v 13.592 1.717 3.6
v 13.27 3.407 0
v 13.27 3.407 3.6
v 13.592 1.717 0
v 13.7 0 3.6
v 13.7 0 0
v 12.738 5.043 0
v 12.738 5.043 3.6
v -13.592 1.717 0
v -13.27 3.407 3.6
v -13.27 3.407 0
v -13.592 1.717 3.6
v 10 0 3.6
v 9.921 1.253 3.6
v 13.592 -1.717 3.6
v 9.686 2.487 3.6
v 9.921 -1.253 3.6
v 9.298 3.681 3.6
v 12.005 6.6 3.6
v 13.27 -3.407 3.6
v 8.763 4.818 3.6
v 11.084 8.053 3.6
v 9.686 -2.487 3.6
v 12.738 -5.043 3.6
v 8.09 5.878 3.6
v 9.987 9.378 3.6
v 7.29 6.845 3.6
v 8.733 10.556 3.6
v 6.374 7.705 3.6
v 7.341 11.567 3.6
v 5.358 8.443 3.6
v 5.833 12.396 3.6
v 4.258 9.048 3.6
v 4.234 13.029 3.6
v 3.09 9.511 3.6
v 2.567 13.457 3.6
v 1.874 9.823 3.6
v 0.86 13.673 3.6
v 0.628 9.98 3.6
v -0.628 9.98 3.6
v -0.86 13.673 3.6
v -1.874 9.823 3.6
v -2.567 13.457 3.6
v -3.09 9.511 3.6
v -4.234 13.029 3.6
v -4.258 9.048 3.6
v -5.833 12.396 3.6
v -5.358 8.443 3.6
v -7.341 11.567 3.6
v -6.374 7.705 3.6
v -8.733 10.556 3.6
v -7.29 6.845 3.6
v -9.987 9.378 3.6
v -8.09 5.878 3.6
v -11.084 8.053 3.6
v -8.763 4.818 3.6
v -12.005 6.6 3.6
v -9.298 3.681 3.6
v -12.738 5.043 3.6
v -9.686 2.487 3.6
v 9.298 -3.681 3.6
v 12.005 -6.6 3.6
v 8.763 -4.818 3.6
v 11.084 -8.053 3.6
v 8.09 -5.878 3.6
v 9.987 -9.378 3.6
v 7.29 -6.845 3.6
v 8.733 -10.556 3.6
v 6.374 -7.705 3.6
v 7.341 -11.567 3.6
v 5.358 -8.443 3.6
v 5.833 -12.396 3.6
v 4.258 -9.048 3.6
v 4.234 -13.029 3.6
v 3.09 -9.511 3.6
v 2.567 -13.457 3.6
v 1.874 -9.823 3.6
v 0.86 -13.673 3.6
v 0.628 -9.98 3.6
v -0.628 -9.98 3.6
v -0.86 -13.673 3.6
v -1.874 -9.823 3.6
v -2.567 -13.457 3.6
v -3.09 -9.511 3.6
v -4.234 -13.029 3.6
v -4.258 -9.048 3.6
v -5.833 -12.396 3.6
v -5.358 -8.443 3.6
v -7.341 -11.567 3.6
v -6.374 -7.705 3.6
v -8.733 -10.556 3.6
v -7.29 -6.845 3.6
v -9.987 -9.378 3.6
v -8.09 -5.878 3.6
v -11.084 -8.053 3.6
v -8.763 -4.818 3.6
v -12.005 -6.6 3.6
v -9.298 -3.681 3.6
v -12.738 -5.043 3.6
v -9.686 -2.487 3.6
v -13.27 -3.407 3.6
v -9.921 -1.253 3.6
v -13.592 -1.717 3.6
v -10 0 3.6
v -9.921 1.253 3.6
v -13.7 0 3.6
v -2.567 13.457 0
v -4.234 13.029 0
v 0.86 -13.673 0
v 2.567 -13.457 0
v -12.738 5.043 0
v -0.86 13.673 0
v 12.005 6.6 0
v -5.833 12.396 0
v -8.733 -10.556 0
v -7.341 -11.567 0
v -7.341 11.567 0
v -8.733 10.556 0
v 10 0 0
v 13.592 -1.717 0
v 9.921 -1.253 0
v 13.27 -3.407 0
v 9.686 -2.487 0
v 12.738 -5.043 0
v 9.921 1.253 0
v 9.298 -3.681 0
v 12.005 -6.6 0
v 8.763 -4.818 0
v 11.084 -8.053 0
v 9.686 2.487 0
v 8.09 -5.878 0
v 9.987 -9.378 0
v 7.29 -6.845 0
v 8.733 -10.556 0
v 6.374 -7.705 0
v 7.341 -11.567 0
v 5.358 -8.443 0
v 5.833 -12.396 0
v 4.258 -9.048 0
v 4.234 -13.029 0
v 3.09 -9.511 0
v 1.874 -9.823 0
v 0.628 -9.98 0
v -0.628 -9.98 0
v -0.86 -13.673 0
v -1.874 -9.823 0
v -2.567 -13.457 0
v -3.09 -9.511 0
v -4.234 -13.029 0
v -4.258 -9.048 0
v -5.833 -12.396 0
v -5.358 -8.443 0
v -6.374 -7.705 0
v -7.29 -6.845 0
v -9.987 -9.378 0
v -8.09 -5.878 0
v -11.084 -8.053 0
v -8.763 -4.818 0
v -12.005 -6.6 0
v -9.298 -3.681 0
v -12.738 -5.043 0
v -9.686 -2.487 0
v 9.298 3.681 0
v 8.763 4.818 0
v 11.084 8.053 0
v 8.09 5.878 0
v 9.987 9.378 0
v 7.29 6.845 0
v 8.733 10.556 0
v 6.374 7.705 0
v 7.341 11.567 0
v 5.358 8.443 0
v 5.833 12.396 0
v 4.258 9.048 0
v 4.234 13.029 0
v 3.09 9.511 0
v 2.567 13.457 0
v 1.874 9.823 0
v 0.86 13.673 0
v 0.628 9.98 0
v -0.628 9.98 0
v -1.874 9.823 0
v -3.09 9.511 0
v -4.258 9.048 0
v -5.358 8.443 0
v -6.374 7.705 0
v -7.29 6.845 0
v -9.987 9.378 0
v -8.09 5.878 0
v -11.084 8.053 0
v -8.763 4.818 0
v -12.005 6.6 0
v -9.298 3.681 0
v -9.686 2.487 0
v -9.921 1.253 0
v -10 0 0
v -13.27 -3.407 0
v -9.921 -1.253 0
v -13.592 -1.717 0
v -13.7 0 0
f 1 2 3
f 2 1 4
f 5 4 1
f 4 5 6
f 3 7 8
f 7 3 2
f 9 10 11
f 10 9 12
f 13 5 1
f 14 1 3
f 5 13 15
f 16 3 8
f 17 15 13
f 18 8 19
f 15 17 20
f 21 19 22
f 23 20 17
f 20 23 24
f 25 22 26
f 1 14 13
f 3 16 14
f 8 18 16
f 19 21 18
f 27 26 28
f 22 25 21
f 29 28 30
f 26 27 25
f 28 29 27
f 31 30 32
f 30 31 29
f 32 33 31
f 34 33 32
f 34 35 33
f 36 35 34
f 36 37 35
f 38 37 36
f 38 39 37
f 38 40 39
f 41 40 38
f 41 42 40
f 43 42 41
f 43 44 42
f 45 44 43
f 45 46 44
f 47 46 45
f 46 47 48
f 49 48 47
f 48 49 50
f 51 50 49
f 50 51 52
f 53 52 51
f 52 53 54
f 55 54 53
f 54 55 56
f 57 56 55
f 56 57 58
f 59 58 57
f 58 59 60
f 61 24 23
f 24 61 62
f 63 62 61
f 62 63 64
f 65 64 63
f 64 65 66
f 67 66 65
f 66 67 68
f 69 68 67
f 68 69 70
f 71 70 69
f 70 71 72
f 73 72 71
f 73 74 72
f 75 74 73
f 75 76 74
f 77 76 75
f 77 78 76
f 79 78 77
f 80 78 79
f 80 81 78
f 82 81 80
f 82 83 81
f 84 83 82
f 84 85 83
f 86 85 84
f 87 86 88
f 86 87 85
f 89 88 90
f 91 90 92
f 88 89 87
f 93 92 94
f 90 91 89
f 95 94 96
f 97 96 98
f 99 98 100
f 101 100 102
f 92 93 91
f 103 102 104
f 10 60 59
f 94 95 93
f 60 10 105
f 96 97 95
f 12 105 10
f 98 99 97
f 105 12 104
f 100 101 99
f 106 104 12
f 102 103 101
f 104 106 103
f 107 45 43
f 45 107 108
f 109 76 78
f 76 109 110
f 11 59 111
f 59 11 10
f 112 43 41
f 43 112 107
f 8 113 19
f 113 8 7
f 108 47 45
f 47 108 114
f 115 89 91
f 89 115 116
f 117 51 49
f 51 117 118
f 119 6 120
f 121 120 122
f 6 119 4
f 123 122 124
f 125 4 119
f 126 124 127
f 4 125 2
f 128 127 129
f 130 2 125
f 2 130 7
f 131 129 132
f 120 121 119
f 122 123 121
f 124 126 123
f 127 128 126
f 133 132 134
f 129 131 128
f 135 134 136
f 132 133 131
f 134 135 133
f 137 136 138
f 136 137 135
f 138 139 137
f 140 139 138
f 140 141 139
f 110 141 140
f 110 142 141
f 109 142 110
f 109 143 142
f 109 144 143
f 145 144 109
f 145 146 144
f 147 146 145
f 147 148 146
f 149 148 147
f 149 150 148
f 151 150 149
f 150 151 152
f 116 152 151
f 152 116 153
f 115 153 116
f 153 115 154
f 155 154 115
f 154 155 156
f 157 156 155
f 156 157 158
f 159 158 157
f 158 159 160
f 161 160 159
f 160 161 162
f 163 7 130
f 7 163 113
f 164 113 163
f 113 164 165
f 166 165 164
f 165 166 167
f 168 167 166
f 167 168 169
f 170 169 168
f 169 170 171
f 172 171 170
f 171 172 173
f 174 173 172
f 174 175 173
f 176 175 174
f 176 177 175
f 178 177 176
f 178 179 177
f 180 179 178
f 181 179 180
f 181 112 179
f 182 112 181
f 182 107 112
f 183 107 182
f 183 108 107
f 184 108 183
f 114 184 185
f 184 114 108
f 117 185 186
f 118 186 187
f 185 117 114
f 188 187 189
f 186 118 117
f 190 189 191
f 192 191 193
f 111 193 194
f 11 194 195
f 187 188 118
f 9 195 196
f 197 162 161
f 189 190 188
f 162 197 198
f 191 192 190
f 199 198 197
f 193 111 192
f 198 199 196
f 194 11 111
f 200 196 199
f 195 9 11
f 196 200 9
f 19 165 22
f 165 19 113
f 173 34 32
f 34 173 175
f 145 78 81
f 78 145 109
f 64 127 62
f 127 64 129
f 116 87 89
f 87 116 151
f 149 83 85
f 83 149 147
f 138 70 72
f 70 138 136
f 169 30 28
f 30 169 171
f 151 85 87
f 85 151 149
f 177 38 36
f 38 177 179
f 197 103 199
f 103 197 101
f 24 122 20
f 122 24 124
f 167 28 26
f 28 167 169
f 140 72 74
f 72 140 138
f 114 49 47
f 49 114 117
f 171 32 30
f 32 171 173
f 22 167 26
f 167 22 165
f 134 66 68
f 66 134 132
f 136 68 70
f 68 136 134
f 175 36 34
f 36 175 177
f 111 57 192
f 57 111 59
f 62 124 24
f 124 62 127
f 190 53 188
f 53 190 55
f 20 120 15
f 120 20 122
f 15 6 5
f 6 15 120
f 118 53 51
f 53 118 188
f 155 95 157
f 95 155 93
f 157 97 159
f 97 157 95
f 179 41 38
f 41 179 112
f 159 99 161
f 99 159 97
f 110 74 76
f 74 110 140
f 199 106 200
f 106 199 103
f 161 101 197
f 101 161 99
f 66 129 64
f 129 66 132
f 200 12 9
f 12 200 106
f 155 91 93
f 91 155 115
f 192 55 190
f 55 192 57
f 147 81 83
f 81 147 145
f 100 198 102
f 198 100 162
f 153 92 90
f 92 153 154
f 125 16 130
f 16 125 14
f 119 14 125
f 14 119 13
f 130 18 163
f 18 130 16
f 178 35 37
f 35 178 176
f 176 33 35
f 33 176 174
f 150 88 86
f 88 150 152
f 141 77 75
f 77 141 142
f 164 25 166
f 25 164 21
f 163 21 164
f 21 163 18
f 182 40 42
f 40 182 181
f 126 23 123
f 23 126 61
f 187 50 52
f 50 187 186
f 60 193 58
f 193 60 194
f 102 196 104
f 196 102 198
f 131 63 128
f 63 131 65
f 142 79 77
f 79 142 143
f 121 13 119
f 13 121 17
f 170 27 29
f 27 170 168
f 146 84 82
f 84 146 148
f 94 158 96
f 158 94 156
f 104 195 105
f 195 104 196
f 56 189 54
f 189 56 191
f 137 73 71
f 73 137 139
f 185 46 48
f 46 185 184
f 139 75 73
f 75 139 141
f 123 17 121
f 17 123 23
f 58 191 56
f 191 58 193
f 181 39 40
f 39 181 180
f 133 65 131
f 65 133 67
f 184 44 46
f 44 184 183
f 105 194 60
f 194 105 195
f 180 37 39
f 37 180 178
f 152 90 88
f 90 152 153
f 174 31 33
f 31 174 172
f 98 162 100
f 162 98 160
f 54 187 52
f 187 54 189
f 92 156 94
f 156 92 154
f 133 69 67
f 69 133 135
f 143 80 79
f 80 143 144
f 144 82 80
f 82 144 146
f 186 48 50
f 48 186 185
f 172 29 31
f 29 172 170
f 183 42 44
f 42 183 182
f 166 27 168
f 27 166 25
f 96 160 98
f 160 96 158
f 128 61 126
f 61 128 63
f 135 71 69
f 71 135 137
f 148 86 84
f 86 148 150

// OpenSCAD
$fn = 50;


difference() {
	union() {
		cylinder(h = 3.6000000000, r = 13.7000000000);
	}
	union() {
		cylinder(h = 3.6000000000, r = 10.0000000000);
	}
}
